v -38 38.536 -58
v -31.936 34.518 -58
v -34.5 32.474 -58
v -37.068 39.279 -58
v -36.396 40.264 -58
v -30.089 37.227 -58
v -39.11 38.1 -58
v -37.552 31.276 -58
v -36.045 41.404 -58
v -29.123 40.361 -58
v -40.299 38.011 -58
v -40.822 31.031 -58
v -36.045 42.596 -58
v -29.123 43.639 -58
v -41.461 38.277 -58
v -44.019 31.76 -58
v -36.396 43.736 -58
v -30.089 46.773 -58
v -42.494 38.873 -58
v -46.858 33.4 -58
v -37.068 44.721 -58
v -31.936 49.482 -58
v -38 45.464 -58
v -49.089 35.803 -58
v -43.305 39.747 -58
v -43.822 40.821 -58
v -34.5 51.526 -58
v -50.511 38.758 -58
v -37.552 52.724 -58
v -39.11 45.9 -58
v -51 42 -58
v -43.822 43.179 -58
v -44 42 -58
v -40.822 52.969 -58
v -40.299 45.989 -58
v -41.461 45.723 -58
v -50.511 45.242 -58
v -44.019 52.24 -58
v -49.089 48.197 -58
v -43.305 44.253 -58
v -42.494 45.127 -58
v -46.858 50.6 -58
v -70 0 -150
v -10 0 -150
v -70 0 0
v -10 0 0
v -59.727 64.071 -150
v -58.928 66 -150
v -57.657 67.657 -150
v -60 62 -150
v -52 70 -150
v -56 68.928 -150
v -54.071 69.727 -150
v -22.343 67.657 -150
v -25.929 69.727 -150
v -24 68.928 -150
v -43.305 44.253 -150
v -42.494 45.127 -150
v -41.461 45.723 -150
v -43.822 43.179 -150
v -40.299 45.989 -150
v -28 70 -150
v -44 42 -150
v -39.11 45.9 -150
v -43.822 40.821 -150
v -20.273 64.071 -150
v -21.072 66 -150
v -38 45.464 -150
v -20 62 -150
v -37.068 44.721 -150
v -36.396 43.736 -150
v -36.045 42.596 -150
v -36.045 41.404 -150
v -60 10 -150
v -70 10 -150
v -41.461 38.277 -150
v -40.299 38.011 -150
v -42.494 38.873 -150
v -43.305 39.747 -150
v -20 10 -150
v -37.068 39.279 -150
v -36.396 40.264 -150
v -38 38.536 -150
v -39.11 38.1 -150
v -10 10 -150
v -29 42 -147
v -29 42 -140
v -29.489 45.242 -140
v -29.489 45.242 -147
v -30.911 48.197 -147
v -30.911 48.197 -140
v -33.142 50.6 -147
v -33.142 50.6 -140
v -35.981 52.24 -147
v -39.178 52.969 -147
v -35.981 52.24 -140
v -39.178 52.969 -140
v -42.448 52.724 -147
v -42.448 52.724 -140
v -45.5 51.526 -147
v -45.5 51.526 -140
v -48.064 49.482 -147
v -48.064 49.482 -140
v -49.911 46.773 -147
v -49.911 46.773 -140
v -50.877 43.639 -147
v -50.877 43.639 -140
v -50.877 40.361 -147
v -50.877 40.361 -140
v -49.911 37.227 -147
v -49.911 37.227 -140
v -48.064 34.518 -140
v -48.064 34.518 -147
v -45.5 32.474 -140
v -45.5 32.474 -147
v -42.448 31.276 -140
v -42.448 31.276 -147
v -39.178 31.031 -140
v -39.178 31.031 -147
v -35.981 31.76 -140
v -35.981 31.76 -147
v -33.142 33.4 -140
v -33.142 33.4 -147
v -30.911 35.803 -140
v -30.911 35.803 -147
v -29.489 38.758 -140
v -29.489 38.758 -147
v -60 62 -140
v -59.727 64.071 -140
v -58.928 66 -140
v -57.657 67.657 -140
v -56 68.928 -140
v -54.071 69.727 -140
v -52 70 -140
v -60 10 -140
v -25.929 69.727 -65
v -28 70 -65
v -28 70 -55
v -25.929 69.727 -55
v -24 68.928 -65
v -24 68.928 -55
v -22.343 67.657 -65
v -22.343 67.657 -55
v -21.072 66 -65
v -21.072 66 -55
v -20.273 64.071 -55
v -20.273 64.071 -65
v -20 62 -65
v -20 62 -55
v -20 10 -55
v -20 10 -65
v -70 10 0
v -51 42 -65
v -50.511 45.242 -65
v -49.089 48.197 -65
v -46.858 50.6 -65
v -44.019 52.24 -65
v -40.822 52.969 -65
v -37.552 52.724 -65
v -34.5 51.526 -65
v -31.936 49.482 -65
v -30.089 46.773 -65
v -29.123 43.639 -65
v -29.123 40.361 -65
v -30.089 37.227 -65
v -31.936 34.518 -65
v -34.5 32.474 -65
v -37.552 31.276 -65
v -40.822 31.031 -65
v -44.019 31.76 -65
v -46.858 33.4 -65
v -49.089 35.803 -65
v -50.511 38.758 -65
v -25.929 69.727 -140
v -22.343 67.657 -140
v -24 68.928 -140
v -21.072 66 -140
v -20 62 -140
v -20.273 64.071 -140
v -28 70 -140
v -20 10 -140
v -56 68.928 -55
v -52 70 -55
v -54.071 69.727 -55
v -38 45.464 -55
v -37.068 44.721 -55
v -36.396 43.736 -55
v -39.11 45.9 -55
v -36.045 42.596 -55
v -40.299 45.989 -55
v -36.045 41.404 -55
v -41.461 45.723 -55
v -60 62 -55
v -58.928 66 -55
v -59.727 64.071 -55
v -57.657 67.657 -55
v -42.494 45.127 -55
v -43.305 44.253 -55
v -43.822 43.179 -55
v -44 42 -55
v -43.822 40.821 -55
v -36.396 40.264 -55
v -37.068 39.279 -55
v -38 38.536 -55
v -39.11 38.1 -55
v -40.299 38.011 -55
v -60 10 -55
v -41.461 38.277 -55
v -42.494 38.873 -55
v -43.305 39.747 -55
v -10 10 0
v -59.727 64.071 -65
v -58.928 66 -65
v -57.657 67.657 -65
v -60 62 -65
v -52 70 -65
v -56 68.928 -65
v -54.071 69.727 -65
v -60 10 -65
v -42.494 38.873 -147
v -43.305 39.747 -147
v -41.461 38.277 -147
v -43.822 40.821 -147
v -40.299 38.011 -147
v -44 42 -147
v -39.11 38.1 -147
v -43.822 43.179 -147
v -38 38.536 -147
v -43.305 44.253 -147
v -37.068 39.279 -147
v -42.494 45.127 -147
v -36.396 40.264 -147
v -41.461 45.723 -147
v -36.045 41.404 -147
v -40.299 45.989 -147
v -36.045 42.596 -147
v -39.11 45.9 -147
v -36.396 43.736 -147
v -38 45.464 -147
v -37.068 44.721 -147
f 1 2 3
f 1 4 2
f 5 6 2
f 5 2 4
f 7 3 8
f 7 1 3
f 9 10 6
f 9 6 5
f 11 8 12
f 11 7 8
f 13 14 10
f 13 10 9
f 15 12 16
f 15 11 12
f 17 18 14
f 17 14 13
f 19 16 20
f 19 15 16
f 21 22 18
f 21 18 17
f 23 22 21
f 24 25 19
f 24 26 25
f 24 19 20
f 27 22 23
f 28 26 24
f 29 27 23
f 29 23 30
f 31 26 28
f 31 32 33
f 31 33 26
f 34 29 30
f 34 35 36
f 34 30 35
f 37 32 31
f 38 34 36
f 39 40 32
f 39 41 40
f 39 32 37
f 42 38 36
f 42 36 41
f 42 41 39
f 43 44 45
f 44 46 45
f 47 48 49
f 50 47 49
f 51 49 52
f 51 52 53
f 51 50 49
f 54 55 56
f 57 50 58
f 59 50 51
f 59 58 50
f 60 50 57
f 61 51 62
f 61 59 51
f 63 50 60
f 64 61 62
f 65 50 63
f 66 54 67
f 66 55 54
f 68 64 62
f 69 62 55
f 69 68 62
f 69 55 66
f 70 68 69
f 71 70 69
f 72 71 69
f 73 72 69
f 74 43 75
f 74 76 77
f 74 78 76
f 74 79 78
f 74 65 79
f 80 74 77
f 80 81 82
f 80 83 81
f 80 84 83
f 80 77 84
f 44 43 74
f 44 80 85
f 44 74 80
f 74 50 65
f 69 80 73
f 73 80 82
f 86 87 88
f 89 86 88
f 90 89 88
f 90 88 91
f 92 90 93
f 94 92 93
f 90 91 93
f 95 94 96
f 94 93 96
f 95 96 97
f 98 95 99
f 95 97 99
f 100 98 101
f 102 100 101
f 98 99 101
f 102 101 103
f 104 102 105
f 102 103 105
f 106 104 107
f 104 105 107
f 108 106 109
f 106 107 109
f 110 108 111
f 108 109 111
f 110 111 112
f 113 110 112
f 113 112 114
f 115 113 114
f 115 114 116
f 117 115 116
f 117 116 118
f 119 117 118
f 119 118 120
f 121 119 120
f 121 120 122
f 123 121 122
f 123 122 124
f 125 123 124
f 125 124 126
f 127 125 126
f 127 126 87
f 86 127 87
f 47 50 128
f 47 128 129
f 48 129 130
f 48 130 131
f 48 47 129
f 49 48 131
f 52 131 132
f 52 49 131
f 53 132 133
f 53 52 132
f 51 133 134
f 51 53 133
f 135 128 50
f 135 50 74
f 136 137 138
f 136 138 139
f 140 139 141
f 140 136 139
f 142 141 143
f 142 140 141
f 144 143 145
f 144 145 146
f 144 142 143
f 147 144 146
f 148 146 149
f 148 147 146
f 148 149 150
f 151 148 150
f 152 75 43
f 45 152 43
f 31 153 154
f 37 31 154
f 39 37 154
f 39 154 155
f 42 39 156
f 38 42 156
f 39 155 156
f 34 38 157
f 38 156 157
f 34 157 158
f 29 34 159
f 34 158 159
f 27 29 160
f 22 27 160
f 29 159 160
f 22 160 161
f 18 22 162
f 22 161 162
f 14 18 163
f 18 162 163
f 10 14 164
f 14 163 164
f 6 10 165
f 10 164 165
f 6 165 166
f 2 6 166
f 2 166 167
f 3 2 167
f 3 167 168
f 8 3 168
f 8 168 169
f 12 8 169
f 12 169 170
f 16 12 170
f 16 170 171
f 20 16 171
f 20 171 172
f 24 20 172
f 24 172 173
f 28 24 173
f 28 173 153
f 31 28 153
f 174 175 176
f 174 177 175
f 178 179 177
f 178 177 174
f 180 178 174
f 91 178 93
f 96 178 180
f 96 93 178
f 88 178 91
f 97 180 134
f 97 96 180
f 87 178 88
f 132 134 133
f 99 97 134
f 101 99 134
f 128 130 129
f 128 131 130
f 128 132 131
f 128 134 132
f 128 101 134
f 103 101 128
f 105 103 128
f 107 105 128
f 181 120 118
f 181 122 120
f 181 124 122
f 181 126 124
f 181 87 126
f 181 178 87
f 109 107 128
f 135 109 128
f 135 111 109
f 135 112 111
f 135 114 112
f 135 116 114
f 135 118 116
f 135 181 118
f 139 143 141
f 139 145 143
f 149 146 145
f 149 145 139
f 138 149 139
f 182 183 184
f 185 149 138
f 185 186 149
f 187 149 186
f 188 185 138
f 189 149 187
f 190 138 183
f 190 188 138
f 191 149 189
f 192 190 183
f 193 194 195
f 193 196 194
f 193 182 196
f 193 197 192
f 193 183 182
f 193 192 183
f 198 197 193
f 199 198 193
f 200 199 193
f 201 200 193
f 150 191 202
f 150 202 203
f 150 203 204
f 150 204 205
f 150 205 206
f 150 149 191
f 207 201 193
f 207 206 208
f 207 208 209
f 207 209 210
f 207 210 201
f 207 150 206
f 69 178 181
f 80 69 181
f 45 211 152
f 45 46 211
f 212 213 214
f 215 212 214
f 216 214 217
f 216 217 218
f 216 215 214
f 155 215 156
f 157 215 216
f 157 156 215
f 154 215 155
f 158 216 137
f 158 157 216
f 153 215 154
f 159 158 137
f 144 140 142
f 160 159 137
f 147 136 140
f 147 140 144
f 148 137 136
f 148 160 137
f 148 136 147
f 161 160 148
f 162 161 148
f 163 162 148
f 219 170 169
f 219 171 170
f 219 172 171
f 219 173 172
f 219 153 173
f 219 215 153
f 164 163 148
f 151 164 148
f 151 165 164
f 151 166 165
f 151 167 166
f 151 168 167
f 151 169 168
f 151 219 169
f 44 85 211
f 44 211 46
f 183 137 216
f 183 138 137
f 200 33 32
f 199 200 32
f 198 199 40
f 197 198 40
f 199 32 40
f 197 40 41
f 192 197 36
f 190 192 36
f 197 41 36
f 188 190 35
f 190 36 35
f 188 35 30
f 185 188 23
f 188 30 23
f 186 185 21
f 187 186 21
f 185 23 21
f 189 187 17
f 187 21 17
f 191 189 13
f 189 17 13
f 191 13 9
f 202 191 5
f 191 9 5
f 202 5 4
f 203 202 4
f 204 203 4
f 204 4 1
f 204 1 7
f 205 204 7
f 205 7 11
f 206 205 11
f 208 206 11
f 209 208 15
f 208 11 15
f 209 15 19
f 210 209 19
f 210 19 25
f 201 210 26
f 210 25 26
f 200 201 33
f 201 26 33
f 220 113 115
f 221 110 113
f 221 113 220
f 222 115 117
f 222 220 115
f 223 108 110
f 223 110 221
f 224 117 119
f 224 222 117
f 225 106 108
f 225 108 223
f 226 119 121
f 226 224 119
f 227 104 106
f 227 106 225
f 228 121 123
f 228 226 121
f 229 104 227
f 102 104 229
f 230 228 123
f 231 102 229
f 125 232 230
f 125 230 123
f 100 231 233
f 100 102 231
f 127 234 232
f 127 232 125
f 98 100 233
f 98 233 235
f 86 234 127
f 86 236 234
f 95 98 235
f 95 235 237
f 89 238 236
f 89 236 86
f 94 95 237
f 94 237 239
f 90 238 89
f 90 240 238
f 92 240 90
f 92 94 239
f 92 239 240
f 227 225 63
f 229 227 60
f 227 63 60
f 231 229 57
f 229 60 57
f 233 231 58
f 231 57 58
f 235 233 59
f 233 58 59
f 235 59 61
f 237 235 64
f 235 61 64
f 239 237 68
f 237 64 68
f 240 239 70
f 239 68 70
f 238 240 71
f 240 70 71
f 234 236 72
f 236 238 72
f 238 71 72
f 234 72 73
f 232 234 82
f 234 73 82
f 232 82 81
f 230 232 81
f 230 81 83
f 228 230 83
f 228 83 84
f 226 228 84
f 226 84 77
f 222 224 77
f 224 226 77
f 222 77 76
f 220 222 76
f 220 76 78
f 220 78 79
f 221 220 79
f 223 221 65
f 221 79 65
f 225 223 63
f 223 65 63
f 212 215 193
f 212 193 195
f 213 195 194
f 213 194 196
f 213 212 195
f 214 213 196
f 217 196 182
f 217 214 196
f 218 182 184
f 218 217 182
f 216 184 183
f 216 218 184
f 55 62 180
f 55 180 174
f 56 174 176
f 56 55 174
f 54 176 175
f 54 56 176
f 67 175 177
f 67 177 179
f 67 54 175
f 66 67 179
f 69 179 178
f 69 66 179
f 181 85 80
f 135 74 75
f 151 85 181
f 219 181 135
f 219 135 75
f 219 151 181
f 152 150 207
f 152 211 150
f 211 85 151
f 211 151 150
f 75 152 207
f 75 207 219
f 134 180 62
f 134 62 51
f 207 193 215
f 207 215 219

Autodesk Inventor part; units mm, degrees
ref_plane "YZ Plane" through (0, 0, 0) normal (1, 0, 0) x (0, 1, 0)
ref_plane "XZ Plane" through (0, 0, 0) normal (0, 1, 0) x (-1, 0, 0)
ref_plane "XY Plane" through (0, 0, 0) normal (0, 0, 1) x (1, 0, 0)
sketch "Boceto1" plane through (0, 0, 0) normal (0, 1, 0) x (-1, 0, 0)
  line L0 (0, 0) -> (80, 0)
  line L1 (80, 0) -> (80, -150)
  line L2 (80, -150) -> (0, -150)
  line L3 (0, -150) -> (0, 0)
  line L4 (80, -150) -> (0, -150)
  line L5 (0, -150) -> (0, -140)
  line L6 (0, -140) -> (80, -140)
  line L7 (80, -140) -> (80, -150)
  line L8 (80, -65) -> (0, -65)
  line L9 (0, -65) -> (0, -55)
  line L10 (0, -55) -> (80, -55)
  line L11 (80, -55) -> (80, -65)
  line L12 (80, -25) -> (0, -25)
  line L13 (0, -25) -> (0, -15)
  line L14 (0, -15) -> (80, -15)
  line L15 (80, -15) -> (80, -25)
  point P0 (0, -65)
  point P1 (0, -15)
  point P2 (0, -25)
  point P3 (0, -55)
  point P4 (80, -55)
  dimension "d0" = 80
  dimension "d1" = 150
  dimension "d4" = 80
  dimension "d5" = 10
  dimension "d6" = 80
  dimension "d7" = 10
  dimension "d8" = 80
  dimension "d9" = 10
  dimension "d17" = 75
  dimension "d19" = 30
extrude "Extrusión1" add sketch "Boceto1" along normal blind 10 contours L0 L1 L14 L3 | L12 L1 L10 L3 | L8 L1 L6 L3
extrude "Extrusión2" add sketch "Boceto1" along normal blind 70 contours L14 L1 L12 L3 | L10 L1 L8 L3 | L6 L1 L2 L3
sketch "Boceto3" plane through (0, 0, -150) normal (0, 0, -1) x (-1, 0, 0)
  circle A0 centre (40, 42) radius 4
  line L0 (0, 0) -> (0, 70) projected
  line L1 (0, 70) -> (80, 70) projected
  line L2 (80, 10) -> (0, 10) projected
  circle A1 centre (40, 42) radius 11
  dimension "d12" = 8
  dimension "d13" = 40
  dimension "d18" = 32
  dimension "d54" = 22
extrude "Extrusión3" cut sketch "Boceto3" against normal blind 10 contours A0
sketch "Boceto4" plane through (-80, 10, -15) normal (0, 0, 1) x (1, 0, 0)
  circle A0 centre (40, 32) radius 4 projected
  circle A1 centre (40, 32) radius 4
  circle A2 centre (40, 32) radius 12.5
  circle A3 centre (24.5, 47.4996) radius 1.5
  circle A4 centre (55.5, 47.4996) radius 1.5
  circle A5 centre (24.5009, 16.4996) radius 1.5
  circle A6 centre (55.4991, 16.4996) radius 1.5
  point P0 (80, -10)
  dimension "d20" = 8
  dimension "d21" = 25
  dimension "d26" = 3
  dimension "d27" = 21.92
  dimension "d28" = 3
  dimension "d29" = 21.92
  dimension "d30" = 3
  dimension "d31" = 3
  dimension "d32" = 21.92
  dimension "d33" = 21.92
  dimension "d47" = 0
  dimension "d48" = 31
  dimension "d51" = 0
  dimension "d53" = 31
extrude "Extrusión4" cut sketch "Boceto4" against normal blind 10 contours A0
extrude "Extrusión6" cut sketch "Boceto4" against normal blind 8 contours A2
sketch "Boceto5" plane through (0, 10, -65) normal (0, 0, -1) x (-1, 0, 0)
  circle A0 centre (40, 32) radius 4 projected
  circle A1 centre (40, 32) radius 4
  point P0 (0, -10)
  dimension "d44" = 8
extrude "Extrusión7" cut sketch "Boceto5" against normal blind 10
sketch "Boceto6" plane through (-80, 10, -140) normal (0, 0, 1) x (1, 0, 0)
  circle A0 centre (40, 32) radius 4 projected
  circle A1 centre (40, 32) radius 11
  point P0 (80, -10)
  dimension "d55" = 22
extrude "Extrusión8" cut sketch "Boceto6" against normal blind 7
sketch "Boceto7" plane through (-80, 10, -15) normal (0, 0, 1) x (1, 0, 0)
  line L0 (0, -10) -> (0, 60) projected
  line L1 (0, 0) -> (80, 0) projected
  line L2 (0, 60) -> (20, 60)
  line L3 (20, 60) -> (20, 0)
  line L4 (20, 0) -> (0, 0)
  line L5 (0, 0) -> (0, 60)
  line L6 (80, 60) -> (60, 60)
  line L7 (60, 60) -> (60, 0)
  line L8 (60, 0) -> (80, 0)
  line L9 (80, 0) -> (80, 60)
  point P0 (80, -10)
  dimension "d58" = 20
  dimension "d59" = 20
extrude "Extrusión9" cut sketch "Boceto7" against normal blind 150
fillet "Empalme1" radius 8 1 edges at (-20, 70, -20)
fillet "Empalme2" radius 8 1 edges at (-60, 70, -20)
fillet "Empalme3" radius 8 1 edges at (-60, 70, -60)
fillet "Empalme4" radius 8 1 edges at (-20, 70, -60)
fillet "Empalme5" radius 8 1 edges at (-60, 70, -145)
fillet "Empalme6" radius 8 1 edges at (-20, 70, -145)
sketch "Boceto8" plane through (-20, 10, -65) normal (0, 0, -1) x (-1, 0, 0)
  circle A0 centre (20, 32) radius 11 projected
  circle A1 centre (20, 32) radius 11
  point P0 (-20, -10)
  dimension "d68" = 22
extrude "Extrusión10" cut sketch "Boceto8" against normal blind 7
sketch "Boceto9" plane through (-80, 0, 0) normal (0, 0, 1) x (1, 0, 0)
  line L0 (0, 0) -> (80, 0) projected
  line L1 (0, 10) -> (10, 10)
  line L2 (10, 10) -> (10, 0)
  line L3 (10, 0) -> (0, 0)
  line L4 (0, 0) -> (0, 10)
  line L5 (0, 10) -> (80, 10) projected
  line L6 (80, 10) -> (70, 10)
  line L7 (70, 10) -> (70, 0)
  line L8 (70, 0) -> (80, 0)
  line L9 (80, 0) -> (80, 10)
  dimension "d71" = 10
  dimension "d72" = 10
extrude "Extrusión11" cut sketch "Boceto9" against normal blind 150 contours L4 L1 L2 L0 | L7 L5 L9 L0
sketch "Boceto10" plane through (-60, 10, -15) normal (0, 0, 1) x (1, 0, 0)
  line L0 (0, 52) -> (0, 0) projected
  line L1 (0, 0) -> (40, 0)
  line L2 (40, 0) -> (40, 60)
  line L3 (40, 60) -> (0, 60)
  line L4 (0, 60) -> (0, 0)
  point P0 (60, -10)
  dimension "d75" = 40
  dimension "d76" = 60
extrude "Extrusión12" cut sketch "Boceto10" against normal blind 10
properties part number "SOPORTE - INFERIOR"
